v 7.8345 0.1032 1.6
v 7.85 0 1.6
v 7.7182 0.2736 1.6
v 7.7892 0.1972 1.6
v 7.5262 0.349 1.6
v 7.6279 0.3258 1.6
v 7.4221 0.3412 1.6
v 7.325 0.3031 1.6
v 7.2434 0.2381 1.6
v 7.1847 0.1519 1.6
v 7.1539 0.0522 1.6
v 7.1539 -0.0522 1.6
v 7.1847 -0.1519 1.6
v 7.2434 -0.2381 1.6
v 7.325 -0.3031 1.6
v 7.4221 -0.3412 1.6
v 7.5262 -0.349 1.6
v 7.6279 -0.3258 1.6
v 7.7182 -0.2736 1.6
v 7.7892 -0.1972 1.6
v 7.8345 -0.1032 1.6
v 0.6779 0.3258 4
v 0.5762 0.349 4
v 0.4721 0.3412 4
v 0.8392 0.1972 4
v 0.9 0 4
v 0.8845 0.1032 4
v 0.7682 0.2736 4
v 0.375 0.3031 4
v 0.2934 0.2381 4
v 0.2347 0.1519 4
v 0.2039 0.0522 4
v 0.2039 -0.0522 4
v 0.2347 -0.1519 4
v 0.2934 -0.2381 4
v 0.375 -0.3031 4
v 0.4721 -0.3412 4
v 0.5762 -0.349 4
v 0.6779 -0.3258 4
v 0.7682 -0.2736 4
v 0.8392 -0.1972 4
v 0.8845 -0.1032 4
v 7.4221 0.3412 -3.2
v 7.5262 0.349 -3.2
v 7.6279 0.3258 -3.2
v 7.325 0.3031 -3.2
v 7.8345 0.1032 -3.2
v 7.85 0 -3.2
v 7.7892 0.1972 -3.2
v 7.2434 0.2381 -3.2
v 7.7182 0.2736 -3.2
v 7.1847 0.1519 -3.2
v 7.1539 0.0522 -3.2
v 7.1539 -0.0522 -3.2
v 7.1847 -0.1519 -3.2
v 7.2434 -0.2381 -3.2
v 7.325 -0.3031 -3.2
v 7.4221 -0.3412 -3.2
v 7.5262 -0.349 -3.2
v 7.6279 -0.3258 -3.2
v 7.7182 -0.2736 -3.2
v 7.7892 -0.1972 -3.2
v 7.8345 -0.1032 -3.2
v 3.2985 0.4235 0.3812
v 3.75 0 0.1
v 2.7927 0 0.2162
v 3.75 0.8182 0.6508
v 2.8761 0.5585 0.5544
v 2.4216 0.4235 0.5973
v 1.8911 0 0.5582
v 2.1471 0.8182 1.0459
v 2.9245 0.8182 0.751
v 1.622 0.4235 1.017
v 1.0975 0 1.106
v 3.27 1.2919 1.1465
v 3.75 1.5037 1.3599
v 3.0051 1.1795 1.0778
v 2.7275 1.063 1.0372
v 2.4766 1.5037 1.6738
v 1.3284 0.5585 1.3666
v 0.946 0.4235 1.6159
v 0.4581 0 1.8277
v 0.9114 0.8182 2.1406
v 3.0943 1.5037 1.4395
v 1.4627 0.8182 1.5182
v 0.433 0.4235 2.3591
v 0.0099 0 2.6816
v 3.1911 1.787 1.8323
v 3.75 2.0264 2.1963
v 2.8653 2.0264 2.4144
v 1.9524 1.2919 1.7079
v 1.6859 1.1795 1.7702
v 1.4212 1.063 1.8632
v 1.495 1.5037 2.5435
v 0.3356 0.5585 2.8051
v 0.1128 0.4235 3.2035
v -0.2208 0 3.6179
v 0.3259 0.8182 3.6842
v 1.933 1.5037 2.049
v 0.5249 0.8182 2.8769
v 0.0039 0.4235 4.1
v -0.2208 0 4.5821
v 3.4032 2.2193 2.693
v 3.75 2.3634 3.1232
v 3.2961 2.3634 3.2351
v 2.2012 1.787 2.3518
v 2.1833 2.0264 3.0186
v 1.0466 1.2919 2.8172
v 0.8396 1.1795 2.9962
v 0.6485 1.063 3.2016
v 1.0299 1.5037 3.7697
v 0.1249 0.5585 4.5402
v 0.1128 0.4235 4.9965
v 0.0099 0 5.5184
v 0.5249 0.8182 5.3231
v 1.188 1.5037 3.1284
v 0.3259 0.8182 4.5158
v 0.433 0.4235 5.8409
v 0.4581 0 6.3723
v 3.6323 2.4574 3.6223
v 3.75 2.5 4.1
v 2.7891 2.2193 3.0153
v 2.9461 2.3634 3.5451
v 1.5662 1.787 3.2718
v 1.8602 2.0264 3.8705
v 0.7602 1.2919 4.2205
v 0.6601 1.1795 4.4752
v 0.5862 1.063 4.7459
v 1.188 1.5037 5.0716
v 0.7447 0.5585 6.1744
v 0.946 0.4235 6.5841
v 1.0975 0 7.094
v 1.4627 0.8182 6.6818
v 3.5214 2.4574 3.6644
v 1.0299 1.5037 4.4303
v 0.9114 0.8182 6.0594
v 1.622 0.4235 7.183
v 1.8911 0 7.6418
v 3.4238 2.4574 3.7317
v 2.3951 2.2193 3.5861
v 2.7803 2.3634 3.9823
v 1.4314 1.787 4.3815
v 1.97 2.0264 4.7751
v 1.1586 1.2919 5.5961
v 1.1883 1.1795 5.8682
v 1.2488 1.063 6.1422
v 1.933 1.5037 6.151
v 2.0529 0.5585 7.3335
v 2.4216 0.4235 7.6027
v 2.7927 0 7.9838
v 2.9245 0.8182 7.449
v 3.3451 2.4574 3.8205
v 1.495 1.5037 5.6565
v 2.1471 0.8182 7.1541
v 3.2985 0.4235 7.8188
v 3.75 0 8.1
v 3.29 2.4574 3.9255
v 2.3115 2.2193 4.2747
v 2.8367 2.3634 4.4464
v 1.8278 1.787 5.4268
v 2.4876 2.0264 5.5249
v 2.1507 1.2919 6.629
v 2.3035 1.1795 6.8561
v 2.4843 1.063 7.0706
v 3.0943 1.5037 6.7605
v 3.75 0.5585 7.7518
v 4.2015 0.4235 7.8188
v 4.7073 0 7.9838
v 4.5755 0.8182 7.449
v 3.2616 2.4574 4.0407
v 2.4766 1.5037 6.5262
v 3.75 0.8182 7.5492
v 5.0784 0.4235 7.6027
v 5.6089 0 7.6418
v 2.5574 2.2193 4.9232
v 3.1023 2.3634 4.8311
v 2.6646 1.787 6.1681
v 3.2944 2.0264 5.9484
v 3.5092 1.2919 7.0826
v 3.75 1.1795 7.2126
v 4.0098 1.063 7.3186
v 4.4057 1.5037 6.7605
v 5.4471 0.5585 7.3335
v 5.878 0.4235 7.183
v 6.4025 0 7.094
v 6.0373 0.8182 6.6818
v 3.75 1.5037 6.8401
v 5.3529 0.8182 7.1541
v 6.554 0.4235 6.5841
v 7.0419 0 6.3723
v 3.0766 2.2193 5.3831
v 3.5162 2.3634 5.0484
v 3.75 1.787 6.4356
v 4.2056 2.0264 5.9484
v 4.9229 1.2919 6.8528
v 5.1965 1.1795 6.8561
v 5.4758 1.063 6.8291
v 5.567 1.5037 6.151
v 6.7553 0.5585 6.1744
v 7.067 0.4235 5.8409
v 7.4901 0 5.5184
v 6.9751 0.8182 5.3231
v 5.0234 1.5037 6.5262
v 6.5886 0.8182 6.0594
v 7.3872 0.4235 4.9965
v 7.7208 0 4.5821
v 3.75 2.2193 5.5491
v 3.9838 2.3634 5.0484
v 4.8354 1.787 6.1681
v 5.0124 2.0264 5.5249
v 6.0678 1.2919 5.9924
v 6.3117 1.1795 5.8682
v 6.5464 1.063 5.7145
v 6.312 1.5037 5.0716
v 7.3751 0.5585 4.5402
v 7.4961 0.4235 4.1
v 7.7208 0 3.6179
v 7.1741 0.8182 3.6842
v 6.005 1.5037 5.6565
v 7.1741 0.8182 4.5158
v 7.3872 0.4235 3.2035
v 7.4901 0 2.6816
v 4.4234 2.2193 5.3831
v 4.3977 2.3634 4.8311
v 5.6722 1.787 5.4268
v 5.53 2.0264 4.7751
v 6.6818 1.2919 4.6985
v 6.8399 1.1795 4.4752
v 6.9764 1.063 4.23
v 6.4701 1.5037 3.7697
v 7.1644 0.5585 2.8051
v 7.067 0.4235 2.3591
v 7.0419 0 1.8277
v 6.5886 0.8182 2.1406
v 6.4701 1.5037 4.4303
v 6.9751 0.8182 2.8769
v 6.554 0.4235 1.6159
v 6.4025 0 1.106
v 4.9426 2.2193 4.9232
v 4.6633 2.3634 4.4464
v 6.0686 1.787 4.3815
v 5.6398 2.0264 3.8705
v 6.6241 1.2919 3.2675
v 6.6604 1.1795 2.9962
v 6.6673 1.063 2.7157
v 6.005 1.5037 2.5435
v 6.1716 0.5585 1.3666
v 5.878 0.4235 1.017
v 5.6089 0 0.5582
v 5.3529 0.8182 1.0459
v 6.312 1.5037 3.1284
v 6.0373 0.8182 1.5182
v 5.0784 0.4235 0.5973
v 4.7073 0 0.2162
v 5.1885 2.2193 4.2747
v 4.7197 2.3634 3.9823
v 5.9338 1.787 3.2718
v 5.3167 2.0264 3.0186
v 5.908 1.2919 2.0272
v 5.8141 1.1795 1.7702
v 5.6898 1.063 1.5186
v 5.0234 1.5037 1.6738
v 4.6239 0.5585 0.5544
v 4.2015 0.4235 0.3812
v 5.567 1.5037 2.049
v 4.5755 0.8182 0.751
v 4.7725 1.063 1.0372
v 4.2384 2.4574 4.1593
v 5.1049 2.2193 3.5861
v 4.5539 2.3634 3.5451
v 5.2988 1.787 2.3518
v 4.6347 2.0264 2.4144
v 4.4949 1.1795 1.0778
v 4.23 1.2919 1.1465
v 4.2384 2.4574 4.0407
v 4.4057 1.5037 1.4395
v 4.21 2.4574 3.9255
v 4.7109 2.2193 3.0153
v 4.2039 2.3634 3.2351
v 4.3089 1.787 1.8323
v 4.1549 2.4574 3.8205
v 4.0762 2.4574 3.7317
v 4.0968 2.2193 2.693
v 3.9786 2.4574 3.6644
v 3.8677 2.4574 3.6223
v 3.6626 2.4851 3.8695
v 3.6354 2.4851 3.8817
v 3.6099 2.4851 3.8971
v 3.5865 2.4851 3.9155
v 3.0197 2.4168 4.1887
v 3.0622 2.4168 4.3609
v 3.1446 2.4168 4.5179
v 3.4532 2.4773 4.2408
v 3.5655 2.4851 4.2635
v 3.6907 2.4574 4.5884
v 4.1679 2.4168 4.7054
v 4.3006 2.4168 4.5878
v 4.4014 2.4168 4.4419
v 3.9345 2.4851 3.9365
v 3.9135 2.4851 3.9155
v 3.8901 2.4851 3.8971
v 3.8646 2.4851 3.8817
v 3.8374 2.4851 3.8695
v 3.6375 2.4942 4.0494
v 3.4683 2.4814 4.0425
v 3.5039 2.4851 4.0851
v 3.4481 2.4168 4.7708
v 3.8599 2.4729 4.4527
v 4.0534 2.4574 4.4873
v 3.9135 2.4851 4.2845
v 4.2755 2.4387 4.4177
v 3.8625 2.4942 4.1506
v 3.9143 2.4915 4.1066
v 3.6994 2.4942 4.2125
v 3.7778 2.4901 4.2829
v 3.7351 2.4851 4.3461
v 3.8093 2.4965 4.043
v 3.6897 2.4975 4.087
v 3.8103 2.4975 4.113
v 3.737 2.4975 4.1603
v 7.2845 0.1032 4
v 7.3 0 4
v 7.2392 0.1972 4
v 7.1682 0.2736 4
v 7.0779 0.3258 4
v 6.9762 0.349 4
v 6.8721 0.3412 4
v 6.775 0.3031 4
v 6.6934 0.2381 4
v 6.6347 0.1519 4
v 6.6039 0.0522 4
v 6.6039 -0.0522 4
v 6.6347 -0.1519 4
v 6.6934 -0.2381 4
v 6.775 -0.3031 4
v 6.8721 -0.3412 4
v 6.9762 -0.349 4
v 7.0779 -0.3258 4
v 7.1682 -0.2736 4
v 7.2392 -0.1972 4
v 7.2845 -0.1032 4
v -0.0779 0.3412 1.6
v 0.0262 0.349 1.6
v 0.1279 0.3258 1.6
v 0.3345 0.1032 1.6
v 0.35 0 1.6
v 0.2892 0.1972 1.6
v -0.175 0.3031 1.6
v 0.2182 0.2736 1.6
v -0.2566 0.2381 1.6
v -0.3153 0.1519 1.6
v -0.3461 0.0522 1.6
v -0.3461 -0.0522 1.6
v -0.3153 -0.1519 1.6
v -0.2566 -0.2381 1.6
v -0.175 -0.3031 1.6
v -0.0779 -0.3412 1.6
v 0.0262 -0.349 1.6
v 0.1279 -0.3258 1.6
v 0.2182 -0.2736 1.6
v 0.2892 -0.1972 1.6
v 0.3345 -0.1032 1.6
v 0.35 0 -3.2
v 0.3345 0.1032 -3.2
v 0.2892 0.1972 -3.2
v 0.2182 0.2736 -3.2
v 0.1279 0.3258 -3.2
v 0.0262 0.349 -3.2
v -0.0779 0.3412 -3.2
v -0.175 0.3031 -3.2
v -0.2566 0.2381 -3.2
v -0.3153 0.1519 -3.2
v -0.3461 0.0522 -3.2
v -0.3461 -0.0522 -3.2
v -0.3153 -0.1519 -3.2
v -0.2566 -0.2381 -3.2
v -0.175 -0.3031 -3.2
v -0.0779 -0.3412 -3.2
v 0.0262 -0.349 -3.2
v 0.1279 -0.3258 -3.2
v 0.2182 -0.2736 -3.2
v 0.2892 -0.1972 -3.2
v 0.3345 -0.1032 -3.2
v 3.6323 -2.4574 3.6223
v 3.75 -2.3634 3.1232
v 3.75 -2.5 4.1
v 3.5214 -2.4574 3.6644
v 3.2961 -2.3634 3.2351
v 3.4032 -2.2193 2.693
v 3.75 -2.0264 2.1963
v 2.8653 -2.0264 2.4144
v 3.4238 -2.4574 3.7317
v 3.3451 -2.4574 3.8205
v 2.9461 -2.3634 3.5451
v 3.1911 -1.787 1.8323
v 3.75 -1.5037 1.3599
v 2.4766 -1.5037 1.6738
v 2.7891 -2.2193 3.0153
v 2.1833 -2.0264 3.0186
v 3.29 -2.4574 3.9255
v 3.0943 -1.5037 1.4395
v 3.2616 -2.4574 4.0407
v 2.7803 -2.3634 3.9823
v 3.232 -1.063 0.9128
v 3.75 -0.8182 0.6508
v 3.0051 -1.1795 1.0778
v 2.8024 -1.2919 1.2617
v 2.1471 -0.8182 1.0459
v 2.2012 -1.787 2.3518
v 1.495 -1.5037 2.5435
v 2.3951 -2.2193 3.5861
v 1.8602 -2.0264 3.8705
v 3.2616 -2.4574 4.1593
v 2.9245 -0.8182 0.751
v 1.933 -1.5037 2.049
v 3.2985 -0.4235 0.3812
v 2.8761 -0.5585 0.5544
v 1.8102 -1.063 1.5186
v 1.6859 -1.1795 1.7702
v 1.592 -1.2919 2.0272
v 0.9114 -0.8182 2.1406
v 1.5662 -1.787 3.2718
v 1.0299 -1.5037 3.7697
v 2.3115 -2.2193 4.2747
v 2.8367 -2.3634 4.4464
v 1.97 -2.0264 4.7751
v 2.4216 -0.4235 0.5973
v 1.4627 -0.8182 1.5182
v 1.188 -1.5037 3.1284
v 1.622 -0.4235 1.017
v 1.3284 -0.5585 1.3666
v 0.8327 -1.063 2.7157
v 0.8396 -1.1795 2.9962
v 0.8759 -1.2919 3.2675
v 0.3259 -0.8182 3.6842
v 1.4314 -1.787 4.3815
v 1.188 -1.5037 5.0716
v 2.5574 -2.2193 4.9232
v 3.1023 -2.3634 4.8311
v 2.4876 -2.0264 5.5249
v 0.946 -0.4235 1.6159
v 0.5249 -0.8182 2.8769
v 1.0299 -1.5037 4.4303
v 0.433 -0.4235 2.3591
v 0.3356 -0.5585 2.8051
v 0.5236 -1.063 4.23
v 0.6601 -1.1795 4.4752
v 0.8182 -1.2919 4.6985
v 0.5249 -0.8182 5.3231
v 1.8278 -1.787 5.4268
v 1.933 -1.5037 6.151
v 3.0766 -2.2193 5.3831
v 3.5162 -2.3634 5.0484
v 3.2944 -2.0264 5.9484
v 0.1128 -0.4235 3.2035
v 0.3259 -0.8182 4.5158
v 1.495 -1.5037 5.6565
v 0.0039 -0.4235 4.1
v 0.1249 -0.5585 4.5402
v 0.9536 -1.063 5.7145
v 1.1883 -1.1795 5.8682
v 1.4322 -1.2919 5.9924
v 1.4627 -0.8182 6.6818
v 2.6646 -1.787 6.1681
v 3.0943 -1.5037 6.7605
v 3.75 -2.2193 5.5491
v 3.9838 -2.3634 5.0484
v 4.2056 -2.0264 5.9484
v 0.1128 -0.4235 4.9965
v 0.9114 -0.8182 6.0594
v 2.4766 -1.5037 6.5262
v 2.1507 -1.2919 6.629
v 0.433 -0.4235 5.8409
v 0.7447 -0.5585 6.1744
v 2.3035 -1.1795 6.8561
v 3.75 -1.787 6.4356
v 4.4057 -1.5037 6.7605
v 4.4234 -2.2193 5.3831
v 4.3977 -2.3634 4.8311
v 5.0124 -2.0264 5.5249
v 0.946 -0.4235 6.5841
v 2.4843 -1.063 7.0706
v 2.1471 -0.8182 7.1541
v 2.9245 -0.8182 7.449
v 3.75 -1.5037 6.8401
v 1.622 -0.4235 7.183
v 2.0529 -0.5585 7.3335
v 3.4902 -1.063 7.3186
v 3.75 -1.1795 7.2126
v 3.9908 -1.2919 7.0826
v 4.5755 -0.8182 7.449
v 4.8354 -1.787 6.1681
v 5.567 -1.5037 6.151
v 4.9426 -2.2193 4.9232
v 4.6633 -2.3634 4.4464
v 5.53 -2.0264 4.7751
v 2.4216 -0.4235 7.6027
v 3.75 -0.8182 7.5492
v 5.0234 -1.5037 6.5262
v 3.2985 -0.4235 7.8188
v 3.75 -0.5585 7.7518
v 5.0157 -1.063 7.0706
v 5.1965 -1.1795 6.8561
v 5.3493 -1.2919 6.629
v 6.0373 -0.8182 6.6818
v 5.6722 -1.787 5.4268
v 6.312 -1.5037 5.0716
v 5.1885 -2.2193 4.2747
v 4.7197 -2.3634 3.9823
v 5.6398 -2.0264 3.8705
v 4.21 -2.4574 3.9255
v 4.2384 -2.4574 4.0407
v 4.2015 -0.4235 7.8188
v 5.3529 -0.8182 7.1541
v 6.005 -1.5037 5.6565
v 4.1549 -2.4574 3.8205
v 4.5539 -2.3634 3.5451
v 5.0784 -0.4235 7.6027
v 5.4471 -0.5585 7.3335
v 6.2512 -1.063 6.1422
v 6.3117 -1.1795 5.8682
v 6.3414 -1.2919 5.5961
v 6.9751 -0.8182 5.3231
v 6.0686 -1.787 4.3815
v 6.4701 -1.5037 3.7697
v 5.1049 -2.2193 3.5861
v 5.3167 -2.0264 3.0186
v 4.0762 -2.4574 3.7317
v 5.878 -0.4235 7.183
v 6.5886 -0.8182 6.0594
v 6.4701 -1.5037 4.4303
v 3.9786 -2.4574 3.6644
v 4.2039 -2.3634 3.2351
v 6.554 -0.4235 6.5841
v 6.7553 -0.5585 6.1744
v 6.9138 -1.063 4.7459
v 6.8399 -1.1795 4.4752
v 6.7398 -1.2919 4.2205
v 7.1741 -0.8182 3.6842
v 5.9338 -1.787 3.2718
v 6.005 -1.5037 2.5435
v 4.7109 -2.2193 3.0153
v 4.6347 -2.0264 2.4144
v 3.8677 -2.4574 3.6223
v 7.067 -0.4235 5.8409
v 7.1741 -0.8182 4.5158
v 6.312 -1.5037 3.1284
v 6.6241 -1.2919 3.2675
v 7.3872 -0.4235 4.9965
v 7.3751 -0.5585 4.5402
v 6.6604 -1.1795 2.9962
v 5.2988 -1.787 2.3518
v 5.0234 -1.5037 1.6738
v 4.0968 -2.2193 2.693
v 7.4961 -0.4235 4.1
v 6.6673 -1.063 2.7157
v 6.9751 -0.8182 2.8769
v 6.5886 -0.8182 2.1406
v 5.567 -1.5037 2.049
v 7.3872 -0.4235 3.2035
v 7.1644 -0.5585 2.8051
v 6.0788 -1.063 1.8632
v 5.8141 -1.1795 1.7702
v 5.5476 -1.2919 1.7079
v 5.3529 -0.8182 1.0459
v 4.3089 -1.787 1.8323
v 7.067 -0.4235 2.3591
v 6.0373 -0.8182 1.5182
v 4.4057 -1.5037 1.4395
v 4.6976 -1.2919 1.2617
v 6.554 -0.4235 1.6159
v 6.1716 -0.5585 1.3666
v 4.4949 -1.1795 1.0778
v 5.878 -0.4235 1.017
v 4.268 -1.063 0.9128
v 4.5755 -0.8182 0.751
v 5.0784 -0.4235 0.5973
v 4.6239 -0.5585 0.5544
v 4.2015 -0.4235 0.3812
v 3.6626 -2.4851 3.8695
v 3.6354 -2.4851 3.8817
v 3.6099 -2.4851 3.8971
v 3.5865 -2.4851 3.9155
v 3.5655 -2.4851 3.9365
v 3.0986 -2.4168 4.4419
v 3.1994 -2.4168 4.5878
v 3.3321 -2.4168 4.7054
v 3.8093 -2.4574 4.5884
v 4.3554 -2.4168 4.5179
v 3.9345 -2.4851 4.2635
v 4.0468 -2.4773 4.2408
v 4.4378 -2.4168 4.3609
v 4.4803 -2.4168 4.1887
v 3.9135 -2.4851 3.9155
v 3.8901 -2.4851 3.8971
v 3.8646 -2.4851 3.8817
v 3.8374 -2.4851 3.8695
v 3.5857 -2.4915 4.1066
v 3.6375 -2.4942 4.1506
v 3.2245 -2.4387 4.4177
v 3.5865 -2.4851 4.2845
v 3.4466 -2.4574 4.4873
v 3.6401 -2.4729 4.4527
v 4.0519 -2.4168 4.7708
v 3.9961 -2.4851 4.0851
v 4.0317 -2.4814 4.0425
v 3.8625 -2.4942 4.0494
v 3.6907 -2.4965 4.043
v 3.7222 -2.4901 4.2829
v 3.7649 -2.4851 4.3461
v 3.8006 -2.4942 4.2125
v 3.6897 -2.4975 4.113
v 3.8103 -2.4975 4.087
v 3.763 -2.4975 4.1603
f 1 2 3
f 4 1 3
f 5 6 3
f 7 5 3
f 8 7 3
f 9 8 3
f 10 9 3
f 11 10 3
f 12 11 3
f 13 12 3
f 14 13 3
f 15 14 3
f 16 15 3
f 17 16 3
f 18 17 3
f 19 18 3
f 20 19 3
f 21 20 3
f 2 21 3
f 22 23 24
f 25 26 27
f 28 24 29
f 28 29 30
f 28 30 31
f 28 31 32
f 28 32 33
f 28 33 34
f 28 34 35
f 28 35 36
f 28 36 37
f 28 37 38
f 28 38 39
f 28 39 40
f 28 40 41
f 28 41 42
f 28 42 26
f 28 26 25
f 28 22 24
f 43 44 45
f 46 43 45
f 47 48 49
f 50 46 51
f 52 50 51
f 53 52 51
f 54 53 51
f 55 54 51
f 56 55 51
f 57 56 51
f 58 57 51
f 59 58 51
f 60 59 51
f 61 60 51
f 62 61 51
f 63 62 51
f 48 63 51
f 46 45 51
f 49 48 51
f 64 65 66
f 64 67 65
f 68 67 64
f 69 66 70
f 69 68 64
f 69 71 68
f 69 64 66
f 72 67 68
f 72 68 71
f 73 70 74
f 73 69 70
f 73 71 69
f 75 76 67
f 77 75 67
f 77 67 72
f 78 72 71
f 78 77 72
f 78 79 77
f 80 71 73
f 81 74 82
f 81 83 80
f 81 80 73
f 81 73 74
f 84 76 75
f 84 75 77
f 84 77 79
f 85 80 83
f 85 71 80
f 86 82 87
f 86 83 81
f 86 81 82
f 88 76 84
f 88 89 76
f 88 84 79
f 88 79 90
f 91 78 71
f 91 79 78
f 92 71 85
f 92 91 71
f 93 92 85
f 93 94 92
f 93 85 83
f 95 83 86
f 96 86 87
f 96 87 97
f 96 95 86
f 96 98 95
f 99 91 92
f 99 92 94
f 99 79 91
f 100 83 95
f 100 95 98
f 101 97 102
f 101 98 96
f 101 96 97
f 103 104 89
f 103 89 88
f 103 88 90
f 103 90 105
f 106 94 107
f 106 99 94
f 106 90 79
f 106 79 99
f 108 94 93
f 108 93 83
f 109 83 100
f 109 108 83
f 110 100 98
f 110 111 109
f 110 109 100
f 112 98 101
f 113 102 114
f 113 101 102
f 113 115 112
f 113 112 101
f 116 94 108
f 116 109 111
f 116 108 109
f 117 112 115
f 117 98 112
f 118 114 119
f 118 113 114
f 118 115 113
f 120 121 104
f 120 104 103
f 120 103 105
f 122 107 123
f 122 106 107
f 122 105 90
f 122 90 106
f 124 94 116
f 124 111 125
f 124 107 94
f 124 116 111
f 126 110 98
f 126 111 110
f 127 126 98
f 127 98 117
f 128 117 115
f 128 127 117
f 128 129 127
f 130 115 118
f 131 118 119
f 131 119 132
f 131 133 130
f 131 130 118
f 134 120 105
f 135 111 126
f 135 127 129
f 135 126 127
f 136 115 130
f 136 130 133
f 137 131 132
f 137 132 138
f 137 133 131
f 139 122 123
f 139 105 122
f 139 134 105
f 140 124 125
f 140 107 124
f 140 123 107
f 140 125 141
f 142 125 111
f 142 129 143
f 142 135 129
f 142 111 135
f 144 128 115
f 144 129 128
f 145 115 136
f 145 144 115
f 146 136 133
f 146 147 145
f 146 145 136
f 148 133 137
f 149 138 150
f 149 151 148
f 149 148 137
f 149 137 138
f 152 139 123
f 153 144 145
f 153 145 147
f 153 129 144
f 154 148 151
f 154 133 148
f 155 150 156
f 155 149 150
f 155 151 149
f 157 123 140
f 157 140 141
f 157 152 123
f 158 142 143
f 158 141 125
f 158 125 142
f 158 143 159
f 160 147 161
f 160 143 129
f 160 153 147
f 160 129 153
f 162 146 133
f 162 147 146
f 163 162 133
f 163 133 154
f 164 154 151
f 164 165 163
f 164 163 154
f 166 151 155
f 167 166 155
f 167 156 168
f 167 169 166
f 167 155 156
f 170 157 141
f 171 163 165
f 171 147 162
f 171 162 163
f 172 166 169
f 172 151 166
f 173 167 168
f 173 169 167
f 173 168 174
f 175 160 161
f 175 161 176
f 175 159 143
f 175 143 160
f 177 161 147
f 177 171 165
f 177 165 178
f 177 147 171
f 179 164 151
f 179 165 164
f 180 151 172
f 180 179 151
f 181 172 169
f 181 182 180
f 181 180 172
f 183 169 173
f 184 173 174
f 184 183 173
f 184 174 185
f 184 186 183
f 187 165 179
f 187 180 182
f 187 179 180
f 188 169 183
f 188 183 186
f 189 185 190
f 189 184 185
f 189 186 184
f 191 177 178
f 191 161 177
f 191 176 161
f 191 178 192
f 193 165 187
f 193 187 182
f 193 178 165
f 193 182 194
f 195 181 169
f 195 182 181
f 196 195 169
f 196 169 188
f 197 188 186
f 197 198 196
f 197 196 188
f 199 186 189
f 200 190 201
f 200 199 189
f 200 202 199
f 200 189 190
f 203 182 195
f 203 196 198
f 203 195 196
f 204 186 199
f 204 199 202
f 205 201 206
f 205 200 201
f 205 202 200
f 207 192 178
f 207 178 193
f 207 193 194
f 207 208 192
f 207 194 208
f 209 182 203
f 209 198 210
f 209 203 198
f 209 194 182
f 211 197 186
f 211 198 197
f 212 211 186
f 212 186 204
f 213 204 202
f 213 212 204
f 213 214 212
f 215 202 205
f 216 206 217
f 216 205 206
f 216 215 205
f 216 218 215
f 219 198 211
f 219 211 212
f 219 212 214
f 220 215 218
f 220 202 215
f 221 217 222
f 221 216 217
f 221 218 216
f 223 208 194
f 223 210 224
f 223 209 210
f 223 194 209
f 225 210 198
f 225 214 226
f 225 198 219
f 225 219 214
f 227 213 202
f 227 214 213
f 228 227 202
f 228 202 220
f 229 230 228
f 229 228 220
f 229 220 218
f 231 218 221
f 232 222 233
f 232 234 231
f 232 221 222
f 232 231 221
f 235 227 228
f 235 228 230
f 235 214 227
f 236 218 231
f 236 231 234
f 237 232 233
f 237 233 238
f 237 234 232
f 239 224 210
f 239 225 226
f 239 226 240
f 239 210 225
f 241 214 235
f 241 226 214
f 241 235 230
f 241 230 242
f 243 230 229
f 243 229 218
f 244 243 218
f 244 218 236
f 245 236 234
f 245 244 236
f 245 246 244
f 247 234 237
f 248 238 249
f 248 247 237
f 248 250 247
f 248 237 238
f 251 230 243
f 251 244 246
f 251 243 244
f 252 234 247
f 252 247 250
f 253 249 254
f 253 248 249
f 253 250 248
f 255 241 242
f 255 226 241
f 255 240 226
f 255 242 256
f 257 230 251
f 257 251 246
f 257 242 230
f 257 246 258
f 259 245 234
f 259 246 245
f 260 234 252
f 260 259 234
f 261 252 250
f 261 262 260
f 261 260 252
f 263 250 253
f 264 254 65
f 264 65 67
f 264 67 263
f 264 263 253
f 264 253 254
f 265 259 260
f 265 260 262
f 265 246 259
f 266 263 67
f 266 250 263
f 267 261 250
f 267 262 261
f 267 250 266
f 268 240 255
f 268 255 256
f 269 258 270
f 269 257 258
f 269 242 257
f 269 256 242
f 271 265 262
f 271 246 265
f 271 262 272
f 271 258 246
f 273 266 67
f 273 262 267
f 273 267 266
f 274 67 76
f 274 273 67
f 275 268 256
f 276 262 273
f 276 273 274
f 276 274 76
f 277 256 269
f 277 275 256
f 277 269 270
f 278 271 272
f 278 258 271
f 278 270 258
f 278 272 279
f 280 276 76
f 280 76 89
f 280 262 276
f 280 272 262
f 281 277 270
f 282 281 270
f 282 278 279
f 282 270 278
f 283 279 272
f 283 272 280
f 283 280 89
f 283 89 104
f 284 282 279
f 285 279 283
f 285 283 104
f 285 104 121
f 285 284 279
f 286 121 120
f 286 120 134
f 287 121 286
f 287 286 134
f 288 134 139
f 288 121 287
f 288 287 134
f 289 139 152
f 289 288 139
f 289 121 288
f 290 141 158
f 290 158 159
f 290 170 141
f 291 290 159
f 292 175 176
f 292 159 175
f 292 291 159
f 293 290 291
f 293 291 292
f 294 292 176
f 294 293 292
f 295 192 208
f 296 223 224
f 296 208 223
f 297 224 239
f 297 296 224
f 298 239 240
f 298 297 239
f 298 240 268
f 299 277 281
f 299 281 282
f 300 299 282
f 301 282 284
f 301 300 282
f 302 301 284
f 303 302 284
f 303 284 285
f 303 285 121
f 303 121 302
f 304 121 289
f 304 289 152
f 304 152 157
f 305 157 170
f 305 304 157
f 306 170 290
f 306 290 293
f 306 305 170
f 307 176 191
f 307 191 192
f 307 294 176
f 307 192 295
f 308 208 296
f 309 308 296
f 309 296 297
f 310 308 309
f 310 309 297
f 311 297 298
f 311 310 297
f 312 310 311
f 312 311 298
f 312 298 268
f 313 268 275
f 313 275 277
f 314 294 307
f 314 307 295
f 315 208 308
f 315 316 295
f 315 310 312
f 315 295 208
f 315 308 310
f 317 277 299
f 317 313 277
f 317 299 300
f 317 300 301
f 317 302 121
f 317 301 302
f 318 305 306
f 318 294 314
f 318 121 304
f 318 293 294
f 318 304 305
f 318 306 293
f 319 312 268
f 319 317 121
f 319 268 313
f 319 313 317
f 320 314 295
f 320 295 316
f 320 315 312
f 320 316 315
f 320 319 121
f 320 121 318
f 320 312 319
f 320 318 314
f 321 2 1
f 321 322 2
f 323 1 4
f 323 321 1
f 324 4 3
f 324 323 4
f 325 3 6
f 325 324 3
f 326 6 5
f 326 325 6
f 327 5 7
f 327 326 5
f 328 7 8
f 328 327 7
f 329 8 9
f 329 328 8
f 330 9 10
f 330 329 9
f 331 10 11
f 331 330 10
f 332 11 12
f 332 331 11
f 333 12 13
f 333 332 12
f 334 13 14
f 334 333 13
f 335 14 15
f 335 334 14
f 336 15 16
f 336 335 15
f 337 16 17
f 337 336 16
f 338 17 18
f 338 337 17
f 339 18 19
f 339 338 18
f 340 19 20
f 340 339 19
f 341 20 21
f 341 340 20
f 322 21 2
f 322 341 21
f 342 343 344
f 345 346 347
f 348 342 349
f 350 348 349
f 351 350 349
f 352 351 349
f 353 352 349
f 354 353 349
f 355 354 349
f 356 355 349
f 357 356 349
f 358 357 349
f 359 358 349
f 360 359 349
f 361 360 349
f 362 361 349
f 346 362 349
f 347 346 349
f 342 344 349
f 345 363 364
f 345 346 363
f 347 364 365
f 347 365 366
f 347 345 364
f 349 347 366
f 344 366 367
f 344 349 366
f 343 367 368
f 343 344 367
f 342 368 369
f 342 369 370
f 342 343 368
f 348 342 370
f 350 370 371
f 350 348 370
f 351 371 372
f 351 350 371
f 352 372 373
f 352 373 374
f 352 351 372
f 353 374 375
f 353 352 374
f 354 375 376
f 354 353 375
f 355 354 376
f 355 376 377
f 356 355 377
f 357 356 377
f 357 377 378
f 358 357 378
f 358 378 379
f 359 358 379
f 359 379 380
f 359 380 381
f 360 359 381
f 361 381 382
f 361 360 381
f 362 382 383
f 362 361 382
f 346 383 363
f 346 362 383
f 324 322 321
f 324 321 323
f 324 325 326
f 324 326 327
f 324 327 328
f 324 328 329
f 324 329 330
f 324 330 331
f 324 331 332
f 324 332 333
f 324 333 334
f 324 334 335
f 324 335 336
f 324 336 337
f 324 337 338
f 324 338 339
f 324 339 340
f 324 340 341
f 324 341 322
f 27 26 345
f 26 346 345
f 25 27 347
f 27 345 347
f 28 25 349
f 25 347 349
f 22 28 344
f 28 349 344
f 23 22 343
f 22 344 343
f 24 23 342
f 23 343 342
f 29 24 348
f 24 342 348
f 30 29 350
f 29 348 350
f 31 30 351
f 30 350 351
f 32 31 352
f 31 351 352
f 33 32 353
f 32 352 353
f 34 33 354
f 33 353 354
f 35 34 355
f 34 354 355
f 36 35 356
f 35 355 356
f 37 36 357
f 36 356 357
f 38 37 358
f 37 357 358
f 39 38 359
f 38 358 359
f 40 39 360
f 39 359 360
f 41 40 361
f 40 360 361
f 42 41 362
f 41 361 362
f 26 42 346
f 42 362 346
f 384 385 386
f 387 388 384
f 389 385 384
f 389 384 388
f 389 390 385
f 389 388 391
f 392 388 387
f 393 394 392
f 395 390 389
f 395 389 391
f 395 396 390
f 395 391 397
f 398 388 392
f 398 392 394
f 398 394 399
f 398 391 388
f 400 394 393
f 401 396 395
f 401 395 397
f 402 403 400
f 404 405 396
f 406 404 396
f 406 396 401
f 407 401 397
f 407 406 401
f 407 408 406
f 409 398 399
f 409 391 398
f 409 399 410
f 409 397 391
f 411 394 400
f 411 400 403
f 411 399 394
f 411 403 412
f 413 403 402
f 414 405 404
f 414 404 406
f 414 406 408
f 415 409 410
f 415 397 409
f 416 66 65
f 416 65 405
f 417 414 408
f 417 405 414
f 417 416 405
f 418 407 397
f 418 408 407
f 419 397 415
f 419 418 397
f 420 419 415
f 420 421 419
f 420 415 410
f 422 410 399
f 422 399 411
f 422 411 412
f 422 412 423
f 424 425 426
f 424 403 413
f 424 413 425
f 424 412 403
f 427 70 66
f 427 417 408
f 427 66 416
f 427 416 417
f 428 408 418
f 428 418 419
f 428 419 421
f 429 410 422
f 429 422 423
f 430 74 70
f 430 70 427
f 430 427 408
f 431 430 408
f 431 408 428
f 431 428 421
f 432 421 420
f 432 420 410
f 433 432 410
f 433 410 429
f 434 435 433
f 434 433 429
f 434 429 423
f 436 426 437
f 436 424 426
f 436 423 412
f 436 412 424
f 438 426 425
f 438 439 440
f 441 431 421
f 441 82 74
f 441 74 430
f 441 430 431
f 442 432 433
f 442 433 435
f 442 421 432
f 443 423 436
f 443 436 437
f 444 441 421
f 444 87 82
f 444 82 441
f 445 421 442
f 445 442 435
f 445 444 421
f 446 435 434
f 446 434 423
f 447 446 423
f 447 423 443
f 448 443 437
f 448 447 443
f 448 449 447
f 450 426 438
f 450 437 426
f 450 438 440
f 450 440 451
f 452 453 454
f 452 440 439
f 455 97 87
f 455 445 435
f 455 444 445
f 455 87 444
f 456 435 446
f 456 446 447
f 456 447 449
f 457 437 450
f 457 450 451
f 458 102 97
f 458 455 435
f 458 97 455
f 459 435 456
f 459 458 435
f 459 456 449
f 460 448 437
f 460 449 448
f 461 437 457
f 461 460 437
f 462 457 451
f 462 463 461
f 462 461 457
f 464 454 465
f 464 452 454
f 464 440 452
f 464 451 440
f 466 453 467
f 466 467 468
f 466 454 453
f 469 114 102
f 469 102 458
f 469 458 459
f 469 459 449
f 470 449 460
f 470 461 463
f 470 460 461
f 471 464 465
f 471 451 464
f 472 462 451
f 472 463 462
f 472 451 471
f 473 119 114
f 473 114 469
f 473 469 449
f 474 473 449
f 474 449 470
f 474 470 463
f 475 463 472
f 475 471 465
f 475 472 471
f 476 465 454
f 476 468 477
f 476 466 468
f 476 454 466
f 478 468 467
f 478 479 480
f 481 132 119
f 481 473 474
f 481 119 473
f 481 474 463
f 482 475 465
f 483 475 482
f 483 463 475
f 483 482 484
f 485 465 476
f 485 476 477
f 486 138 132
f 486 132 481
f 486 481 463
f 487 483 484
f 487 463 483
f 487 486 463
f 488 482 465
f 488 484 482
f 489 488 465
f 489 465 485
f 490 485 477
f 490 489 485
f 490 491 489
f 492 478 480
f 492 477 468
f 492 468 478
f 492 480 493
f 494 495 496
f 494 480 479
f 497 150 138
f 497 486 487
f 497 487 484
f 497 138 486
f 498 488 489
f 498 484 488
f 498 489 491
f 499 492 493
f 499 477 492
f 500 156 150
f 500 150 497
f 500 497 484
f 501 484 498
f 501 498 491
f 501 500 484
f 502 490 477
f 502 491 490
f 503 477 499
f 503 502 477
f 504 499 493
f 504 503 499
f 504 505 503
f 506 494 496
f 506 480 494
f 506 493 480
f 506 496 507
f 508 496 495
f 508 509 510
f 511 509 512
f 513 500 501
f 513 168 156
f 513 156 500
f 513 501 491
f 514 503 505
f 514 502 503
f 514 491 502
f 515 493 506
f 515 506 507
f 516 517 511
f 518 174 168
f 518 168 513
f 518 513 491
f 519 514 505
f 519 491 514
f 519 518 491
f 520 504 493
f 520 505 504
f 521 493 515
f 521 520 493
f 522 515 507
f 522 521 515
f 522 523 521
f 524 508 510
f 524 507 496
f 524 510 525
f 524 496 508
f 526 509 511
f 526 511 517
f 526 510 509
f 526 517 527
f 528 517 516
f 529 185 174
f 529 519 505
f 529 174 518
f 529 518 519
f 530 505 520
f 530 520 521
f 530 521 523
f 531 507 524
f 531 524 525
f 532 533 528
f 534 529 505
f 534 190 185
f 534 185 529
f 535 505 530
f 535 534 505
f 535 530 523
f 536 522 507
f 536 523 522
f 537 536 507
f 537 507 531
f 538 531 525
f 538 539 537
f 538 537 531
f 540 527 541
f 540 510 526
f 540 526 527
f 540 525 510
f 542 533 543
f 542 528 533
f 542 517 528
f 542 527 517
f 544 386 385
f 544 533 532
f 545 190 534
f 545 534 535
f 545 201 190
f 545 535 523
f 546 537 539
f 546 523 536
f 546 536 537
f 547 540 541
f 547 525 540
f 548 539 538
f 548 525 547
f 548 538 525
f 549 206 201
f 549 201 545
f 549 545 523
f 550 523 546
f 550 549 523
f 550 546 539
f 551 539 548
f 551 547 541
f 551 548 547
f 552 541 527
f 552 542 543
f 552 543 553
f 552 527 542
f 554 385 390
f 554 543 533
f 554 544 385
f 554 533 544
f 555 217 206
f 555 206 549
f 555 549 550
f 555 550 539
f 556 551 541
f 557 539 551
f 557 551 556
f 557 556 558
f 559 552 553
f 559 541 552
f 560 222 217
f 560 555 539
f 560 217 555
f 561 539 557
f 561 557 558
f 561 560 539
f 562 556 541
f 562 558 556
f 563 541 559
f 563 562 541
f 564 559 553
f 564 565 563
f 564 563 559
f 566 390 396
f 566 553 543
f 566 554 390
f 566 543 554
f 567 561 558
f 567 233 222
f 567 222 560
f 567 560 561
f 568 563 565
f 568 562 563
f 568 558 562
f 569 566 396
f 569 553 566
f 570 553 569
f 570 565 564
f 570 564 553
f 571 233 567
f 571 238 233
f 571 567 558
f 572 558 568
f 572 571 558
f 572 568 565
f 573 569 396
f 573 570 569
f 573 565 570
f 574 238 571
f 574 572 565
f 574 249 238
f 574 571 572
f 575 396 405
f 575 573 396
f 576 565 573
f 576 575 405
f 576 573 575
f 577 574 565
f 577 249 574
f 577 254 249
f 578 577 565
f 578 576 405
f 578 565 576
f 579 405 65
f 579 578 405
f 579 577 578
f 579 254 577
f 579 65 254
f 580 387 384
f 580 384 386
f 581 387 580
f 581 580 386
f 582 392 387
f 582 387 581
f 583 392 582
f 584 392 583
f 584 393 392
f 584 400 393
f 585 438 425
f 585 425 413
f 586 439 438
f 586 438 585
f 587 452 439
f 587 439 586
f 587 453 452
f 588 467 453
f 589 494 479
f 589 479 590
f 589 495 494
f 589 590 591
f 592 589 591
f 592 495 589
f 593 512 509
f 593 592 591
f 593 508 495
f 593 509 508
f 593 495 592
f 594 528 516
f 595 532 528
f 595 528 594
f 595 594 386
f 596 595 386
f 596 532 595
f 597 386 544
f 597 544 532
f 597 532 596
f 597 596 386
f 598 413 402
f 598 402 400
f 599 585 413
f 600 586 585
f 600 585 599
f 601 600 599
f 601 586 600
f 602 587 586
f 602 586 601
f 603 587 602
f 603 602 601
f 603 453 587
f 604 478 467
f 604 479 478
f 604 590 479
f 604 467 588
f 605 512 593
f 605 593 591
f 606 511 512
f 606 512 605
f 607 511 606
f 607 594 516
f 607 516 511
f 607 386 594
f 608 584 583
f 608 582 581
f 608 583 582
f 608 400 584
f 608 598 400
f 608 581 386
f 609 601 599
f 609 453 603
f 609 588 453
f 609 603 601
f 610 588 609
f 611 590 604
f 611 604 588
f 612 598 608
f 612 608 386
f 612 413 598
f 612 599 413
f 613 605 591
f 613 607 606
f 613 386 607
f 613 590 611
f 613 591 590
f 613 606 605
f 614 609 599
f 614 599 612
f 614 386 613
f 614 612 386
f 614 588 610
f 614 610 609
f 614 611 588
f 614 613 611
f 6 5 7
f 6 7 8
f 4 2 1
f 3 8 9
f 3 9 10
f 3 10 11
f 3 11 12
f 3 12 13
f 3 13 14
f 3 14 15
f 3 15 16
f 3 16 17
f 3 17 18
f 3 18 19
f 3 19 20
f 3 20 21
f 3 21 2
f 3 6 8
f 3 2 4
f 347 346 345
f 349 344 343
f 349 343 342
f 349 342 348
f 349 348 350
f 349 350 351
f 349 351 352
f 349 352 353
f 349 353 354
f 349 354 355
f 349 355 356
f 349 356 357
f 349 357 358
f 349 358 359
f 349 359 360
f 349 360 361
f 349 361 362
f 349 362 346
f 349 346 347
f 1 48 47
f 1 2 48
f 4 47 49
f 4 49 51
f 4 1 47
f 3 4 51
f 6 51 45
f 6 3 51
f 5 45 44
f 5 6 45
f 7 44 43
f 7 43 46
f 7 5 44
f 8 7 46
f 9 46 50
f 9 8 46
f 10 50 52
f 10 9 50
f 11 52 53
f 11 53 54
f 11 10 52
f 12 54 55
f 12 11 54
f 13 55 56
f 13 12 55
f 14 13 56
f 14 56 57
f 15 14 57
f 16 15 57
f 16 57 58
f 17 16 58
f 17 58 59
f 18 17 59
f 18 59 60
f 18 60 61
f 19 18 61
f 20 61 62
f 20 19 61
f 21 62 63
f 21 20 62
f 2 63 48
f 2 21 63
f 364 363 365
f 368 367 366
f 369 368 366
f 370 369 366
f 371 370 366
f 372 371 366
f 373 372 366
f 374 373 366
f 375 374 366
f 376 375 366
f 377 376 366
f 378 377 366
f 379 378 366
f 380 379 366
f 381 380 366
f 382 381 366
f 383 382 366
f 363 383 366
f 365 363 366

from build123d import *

# Parameters (mm, degrees)
SKETCH001_R       = 0.35
PAD001_DEPTH      = 1.6
PAD001_DEPTH_BACK = 3.2
SKETCH002_R       = 0.35
SKETCH003_R       = 0.35
SKETCH004_R       = 0.35
SKETCH005_R       = 0.35


with BuildPart() as pad001:
    # Sketch001 → Pad001 (new body, two sides)
    with BuildSketch(Plane.XY) as pad001_sk:
        Circle(SKETCH001_R)
        with Locations((7.5, 0)):
            Circle(SKETCH001_R)
    extrude(amount=PAD001_DEPTH)
    extrude(pad001_sk.sketch, amount=-PAD001_DEPTH_BACK)


with BuildPart() as revolution:
    # Sketch → Revolution (revolve)
    with BuildSketch(Plane.YZ.offset(3.75)):
        with BuildLine():
            Line((-2.5, 4.1), (2.5, 4.1))
            ThreePointArc((0, 0.1), (1.786986, 1.764384), (2.5, 4.1))
            ThreePointArc((-2.5, 4.1), (-1.786986, 1.764384), (0, 0.1))
        make_face()
    revolve(axis=Axis((3.75, -3.32079, 4.1), (0, 1, 0)))


with BuildPart() as loft_body:
    # Sketch002 → Loft section 0
    with BuildSketch(Plane.XY.offset(4)):
        with Locations((0.55, 0)):
            Circle(SKETCH002_R)
    # Sketch003 → Loft section 1
    with BuildSketch(Plane.XY.offset(1.6)):
        Circle(SKETCH003_R)
    loft()


with BuildPart() as loft001:
    # Sketch004 → Loft001 section 0
    with BuildSketch(Plane.XY.offset(1.6)):
        with Locations((7.5, 0)):
            Circle(SKETCH004_R)
    # Sketch005 → Loft001 section 1
    with BuildSketch(Plane.XY.offset(4)):
        with Locations((6.95, 0)):
            Circle(SKETCH005_R)
    loft()


solid = Compound([pad001.part, revolution.part, loft_body.part, loft001.part])
